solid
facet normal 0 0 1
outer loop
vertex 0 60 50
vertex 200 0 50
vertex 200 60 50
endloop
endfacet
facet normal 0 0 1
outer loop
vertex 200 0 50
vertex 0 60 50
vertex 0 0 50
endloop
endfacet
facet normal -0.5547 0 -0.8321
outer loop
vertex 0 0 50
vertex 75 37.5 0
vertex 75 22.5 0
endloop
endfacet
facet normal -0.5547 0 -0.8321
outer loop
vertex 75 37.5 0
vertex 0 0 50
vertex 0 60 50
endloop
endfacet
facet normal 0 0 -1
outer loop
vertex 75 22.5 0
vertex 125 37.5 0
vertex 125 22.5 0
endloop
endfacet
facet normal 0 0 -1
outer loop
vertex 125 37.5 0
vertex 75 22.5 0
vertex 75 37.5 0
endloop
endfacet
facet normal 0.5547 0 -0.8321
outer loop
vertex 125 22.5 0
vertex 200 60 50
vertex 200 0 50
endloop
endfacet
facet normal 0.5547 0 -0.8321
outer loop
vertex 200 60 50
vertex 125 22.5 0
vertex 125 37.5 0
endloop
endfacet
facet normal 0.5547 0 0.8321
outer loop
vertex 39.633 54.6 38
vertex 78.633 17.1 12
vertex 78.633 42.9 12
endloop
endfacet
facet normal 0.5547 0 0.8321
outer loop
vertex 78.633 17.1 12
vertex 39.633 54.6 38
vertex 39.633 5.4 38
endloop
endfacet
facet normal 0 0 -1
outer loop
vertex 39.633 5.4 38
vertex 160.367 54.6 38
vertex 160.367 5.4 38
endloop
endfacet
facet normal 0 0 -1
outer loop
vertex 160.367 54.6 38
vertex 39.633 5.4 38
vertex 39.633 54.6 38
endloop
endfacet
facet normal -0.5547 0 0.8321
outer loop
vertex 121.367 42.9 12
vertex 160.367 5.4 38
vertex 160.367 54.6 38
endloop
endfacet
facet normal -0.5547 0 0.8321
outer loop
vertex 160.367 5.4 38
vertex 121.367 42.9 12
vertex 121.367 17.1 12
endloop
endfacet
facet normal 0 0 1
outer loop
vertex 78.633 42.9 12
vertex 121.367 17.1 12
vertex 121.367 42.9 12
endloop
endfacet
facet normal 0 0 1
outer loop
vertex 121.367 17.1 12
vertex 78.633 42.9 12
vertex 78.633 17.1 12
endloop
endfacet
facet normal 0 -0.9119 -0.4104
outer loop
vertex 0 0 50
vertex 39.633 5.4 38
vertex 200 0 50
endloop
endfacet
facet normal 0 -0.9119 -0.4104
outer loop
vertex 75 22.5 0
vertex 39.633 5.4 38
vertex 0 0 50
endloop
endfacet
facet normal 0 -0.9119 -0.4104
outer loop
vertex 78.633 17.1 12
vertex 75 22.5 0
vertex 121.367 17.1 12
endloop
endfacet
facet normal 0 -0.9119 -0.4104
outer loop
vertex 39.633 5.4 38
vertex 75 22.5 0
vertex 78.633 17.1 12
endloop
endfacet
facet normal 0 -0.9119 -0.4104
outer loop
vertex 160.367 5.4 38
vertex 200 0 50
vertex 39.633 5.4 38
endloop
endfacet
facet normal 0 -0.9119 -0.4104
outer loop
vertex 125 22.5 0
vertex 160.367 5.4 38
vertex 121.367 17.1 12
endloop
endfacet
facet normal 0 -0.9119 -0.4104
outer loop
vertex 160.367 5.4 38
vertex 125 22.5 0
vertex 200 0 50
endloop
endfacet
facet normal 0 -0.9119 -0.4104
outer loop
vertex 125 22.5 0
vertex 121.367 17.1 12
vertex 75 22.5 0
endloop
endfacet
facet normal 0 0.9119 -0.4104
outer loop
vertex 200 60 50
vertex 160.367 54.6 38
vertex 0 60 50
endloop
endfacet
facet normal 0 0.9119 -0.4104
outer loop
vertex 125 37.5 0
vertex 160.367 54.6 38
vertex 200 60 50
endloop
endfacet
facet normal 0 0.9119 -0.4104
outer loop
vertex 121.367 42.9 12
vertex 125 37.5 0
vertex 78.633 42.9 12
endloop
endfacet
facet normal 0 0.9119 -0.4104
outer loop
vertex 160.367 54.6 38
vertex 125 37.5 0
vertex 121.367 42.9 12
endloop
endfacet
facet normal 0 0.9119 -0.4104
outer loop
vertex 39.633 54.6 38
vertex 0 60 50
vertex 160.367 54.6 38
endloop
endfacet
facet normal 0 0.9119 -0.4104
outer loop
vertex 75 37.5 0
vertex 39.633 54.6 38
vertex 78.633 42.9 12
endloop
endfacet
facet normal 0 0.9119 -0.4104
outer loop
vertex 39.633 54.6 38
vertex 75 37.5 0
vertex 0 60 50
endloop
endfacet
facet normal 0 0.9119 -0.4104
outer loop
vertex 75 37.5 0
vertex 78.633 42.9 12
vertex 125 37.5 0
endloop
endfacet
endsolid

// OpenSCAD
handle_length = 200;
handle_width = 60;
handle_height = 50;

base_length = 50;
base_width = 15;
base_height = 0;

mirror([0,1,0]) rotate([90,0,0])
intersection() {
    linear_extrude(handle_width)
    difference() {
        polygon([
            [0, handle_height],
            [handle_length, handle_height],
            [(handle_length-base_length)/2 + base_length, 0],
            [(handle_length-base_length)/2, 0]
        ]);
        
        offset(-12) {
            polygon([
                [0, handle_height],
                [handle_length, handle_height],
                [(handle_length-base_length)/2 + base_length, 0],
                [(handle_length-base_length)/2, 0]
            ]);
        }
    }
    mirror([-1, 0, 1])
    linear_extrude(handle_length)
    polygon([
        [0, handle_height],
        [handle_width, handle_height],
        [(handle_width-base_width)/2 + base_width, 0],
        [(handle_width-base_width)/2, 0]
    ]);
}
